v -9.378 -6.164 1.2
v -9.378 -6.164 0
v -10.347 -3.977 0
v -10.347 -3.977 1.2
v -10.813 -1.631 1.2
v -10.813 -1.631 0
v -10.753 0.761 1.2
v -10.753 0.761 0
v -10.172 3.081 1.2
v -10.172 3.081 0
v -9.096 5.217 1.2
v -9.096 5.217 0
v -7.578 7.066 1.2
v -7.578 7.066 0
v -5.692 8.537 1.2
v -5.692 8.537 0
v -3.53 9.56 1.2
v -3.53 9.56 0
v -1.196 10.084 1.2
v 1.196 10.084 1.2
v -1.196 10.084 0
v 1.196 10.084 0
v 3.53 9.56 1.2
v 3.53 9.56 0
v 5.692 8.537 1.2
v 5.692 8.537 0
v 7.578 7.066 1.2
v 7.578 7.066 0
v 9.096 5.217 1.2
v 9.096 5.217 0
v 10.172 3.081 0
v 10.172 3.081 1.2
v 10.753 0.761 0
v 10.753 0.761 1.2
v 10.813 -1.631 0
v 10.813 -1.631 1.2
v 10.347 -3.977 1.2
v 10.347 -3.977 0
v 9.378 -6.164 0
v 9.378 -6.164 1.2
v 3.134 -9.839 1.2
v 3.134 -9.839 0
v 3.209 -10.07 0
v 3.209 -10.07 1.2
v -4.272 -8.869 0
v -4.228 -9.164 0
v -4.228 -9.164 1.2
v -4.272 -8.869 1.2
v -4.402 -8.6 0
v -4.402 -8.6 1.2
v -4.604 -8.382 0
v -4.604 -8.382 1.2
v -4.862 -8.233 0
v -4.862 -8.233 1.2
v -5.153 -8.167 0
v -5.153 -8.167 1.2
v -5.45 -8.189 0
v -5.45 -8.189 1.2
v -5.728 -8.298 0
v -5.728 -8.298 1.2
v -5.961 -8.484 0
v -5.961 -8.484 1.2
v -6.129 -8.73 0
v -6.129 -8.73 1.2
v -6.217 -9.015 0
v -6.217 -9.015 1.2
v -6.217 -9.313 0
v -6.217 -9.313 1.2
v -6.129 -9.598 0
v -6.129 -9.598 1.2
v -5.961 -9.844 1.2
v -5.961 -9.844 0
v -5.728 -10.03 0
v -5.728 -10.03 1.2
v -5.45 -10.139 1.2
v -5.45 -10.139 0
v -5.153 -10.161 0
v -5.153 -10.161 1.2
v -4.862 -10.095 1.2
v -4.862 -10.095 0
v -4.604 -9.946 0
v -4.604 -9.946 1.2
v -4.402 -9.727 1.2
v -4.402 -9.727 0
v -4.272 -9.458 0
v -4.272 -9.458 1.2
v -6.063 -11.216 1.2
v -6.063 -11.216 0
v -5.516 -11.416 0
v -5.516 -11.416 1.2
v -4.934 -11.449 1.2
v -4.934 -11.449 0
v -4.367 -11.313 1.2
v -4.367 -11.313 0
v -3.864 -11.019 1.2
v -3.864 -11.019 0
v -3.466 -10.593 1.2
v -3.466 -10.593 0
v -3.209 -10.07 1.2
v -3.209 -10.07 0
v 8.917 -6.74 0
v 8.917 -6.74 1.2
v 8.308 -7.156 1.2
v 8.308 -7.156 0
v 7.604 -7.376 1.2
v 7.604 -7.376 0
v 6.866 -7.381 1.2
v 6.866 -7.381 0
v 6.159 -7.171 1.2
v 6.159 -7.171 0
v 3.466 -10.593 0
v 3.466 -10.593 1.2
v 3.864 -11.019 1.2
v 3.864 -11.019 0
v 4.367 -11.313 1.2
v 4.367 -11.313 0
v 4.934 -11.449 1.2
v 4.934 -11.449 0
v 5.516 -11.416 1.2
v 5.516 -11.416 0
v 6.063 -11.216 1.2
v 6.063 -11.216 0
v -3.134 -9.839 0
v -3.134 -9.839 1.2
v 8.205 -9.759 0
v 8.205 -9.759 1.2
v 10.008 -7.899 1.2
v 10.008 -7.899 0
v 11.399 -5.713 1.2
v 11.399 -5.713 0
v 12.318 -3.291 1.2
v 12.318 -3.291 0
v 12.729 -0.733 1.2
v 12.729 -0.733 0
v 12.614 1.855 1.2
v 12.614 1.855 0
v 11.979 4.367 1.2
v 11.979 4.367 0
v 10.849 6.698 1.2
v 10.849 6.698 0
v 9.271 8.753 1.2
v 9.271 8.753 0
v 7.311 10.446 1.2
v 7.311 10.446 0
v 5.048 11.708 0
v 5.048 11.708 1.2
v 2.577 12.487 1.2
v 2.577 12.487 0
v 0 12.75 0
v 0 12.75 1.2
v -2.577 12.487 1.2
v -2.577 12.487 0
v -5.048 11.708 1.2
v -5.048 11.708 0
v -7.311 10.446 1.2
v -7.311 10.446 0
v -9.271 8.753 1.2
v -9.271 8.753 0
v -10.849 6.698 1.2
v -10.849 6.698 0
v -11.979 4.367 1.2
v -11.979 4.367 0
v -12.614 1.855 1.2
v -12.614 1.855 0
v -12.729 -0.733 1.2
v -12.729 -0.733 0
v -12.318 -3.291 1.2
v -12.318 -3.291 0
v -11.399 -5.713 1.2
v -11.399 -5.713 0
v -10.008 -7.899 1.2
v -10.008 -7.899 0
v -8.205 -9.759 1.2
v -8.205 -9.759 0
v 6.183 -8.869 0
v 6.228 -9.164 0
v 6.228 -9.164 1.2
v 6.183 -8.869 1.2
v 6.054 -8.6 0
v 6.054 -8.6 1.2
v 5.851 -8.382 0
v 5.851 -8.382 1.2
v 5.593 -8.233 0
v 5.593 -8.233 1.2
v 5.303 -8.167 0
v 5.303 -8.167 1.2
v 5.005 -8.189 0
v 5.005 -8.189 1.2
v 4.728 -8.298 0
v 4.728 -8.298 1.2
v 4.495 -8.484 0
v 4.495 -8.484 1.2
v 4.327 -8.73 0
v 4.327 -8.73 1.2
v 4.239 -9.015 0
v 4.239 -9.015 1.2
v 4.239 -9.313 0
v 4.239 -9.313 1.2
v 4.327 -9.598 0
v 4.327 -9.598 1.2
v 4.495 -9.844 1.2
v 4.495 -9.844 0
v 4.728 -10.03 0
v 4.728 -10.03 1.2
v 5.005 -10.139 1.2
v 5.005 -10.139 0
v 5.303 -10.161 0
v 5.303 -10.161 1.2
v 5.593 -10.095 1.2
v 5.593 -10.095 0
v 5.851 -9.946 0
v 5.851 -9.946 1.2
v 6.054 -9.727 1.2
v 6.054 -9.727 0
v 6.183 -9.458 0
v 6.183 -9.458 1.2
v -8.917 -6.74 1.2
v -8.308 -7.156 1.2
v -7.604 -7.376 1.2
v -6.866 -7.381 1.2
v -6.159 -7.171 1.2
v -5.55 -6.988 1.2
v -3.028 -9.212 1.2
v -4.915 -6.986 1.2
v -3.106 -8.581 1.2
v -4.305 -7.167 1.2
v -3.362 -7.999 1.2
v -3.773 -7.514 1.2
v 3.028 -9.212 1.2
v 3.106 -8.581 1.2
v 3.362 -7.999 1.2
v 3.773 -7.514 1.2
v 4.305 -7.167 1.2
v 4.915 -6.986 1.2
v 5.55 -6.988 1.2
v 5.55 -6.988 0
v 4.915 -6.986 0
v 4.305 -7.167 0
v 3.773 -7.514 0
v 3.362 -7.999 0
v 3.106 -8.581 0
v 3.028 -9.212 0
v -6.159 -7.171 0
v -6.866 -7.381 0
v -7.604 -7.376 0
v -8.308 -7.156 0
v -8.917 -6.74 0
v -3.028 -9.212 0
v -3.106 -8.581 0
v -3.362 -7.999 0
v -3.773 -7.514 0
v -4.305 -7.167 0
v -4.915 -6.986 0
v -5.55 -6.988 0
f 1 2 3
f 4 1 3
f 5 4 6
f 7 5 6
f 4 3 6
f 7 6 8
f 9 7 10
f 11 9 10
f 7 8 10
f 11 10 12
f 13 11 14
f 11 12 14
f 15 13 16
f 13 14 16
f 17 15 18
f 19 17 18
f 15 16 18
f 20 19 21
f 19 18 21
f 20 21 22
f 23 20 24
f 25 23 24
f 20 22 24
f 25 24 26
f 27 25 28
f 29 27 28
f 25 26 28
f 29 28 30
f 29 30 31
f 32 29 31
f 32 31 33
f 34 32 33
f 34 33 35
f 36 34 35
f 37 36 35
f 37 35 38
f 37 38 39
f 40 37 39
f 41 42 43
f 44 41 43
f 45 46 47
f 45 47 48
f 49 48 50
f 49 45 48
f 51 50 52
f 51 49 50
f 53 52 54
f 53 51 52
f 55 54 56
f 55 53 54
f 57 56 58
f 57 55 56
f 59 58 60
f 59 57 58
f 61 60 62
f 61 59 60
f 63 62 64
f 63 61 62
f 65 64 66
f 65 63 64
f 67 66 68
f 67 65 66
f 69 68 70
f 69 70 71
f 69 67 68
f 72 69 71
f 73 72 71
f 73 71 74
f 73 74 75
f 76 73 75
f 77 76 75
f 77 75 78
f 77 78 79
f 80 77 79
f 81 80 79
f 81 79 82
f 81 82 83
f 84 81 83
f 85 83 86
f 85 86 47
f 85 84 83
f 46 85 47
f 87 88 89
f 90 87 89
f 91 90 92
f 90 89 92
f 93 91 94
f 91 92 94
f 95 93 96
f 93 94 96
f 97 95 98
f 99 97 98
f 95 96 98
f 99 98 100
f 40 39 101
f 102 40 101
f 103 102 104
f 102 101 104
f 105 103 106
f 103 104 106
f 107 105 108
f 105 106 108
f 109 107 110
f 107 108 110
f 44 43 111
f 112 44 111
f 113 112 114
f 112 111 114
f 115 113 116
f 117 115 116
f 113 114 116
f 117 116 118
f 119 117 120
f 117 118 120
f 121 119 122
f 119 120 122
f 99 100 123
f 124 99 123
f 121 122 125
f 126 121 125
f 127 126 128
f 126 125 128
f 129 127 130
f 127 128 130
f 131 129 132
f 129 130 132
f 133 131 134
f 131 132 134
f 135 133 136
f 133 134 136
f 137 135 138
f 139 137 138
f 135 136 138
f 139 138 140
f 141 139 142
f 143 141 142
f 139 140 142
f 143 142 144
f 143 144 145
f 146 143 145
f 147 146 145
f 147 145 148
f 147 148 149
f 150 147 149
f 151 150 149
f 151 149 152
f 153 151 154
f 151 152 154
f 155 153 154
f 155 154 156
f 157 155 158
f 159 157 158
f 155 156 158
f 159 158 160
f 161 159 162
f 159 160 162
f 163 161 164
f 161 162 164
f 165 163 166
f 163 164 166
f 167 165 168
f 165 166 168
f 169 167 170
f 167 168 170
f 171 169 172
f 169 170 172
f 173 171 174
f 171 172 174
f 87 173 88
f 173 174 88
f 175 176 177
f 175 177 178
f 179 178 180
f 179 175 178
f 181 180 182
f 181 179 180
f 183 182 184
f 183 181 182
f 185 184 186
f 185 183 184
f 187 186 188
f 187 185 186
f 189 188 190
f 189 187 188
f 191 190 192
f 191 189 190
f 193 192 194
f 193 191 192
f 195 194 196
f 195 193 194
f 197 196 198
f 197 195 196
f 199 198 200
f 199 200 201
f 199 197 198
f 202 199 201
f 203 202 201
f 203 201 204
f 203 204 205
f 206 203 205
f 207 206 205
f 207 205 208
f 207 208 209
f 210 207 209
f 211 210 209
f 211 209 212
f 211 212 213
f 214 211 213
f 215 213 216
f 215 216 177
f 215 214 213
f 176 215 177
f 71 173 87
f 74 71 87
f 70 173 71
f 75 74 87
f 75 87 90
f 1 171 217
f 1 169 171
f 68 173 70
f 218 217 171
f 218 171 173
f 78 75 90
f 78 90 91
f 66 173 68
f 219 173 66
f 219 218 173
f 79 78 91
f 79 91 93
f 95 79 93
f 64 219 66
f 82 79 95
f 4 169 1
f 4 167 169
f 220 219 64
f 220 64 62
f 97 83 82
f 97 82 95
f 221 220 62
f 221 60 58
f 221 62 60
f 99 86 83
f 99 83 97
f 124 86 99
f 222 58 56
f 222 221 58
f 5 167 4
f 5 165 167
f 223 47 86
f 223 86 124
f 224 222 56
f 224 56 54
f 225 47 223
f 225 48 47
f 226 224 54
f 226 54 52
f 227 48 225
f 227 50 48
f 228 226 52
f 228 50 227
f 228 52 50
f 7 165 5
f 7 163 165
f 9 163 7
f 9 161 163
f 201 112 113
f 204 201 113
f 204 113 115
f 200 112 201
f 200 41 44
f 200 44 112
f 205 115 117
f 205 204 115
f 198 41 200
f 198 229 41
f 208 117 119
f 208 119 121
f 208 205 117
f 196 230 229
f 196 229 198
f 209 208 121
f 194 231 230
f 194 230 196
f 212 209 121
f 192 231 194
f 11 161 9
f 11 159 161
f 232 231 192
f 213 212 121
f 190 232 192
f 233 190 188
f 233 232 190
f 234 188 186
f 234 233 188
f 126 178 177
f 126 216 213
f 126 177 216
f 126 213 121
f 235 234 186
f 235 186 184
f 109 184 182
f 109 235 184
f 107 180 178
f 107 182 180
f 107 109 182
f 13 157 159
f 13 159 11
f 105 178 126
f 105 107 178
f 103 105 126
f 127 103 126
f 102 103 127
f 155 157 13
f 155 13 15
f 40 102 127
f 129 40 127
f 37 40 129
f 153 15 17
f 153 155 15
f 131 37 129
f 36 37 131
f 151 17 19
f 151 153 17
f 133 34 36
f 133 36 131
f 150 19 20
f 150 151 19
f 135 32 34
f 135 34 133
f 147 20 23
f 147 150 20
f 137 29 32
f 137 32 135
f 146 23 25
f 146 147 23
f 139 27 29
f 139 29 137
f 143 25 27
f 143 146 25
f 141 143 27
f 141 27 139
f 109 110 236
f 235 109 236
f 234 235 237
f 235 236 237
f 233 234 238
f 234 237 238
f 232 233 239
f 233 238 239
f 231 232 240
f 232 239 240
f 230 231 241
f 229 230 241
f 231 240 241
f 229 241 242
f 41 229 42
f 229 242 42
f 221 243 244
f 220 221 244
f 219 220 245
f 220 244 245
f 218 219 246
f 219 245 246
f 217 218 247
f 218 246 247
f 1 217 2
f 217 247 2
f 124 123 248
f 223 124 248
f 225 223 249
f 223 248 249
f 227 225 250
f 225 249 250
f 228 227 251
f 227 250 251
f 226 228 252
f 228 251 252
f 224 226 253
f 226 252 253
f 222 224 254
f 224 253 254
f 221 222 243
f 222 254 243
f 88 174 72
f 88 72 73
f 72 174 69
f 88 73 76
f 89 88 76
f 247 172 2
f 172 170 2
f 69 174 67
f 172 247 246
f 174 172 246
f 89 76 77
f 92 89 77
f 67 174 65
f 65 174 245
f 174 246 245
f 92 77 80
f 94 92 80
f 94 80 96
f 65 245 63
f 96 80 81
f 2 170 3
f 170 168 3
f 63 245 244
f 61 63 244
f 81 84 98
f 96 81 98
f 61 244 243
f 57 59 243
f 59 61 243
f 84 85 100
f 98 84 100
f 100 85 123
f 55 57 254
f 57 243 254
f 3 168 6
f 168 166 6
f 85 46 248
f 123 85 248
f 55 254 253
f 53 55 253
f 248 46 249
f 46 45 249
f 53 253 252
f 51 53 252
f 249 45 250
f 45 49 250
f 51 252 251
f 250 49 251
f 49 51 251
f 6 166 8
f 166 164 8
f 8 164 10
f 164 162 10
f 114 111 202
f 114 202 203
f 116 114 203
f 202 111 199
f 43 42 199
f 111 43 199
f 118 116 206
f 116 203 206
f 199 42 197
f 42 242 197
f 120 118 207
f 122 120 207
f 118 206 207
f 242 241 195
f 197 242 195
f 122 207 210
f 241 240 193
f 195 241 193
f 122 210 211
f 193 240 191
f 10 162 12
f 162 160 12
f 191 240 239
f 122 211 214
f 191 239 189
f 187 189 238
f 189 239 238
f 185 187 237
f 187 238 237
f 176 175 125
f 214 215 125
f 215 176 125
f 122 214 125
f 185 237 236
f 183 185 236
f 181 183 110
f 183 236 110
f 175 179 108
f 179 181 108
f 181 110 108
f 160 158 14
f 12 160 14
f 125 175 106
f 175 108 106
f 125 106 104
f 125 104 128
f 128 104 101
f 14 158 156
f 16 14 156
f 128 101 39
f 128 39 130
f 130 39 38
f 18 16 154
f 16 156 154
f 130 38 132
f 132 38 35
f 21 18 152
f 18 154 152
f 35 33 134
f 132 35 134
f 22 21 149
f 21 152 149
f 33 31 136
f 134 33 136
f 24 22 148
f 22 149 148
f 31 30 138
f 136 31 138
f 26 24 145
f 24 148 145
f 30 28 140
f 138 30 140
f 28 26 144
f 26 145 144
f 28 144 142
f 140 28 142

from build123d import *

# Parameters (mm, degrees)
SKETCH_3_R      = 1
EXTRUDE_1_DEPTH = 1.2


with BuildPart() as part:
    # Эскиз3 → Бобышка-Вытянуть1 (new body)
    with BuildSketch(Plane.XY):
        with BuildLine():
            Line((-3.208591813, -10.070429847), (-3.13392227, -9.838843592))
            ThreePointArc((-3.13392227, -9.838843592), (-3.772590397, -7.513749153), (-6.159272929, -7.170663716))
            ThreePointArc((-6.159272929, -7.170663716), (-7.964052136, -7.291836988), (-9.378160244, -6.16391447))
            ThreePointArc((-9.378160244, -6.16391447), (0, 10.15), (9.378160244, -6.16391447))
            ThreePointArc((9.378160244, -6.16391447), (7.964052136, -7.291836988), (6.159272929, -7.170663716))
            ThreePointArc((6.159272929, -7.170663716), (3.772590397, -7.513749153), (3.13392227, -9.838843592))
            Line((3.13392227, -9.838843592), (3.208591813, -10.070429847))
            ThreePointArc((3.208591813, -10.070429847), (4.367179244, -11.312788363), (6.063182163, -11.216074271))
            ThreePointArc((6.063182163, -11.216074271), (0, 12.75), (-6.063182163, -11.216074271))
            ThreePointArc((-6.063182163, -11.216074271), (-4.367179244, -11.312788363), (-3.208591813, -10.070429847))
        make_face()
        with Locations((-5.227775517, -9.163729839)):
            Circle(SKETCH_3_R, mode=Mode.SUBTRACT)
        with Locations((5.227775517, -9.163729839)):
            Circle(SKETCH_3_R, mode=Mode.SUBTRACT)
    extrude(amount=EXTRUDE_1_DEPTH)


solid = part.part
